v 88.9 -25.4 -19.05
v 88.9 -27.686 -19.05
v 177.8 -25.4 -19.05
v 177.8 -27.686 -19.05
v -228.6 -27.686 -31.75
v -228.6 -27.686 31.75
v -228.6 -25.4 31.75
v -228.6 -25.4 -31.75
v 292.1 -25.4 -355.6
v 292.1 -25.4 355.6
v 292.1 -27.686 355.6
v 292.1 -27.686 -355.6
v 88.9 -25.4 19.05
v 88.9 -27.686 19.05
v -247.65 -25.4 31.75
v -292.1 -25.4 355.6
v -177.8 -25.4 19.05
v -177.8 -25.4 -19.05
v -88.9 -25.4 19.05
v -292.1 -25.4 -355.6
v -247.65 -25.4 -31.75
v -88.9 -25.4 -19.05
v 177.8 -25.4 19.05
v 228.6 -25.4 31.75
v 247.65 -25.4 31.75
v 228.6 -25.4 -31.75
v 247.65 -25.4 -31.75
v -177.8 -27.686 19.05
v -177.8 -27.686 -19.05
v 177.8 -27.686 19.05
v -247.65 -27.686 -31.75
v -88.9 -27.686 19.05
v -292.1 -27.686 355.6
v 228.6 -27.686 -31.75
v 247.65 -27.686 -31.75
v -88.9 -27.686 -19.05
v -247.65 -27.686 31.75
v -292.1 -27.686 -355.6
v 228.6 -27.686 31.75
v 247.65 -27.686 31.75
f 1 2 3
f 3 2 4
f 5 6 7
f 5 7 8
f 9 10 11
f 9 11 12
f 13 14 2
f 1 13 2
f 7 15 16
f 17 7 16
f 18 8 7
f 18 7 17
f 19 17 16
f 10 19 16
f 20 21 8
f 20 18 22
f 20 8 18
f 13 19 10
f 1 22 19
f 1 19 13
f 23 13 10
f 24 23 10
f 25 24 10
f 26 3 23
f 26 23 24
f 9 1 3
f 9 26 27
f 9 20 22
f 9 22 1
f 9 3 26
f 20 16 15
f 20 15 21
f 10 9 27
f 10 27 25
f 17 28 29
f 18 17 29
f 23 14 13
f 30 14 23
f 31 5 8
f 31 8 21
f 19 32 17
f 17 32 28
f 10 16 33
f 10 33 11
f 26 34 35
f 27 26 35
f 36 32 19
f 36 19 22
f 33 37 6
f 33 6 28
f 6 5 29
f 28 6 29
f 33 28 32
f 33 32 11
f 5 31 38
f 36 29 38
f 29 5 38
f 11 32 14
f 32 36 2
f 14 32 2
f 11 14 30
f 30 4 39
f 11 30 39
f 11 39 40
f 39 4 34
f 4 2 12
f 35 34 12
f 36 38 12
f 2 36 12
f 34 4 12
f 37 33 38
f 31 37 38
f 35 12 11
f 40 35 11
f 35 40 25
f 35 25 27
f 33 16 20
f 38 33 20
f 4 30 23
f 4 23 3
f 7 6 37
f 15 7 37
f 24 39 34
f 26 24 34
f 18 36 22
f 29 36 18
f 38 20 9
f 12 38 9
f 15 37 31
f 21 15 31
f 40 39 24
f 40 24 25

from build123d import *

# Parameters (mm, degrees)
SKETCH1_W           = 584.2
SKETCH1_H           = 711.2
BOSS_EXTRUDE1_DEPTH = 2.286
SKETCH3_W           = 19.05
SKETCH3_H           = 63.5
SKETCH3_W_2         = 88.9
SKETCH3_H_2         = 38.1
CUT_EXTRUDE1_DEPTH  = 461.19451952


with BuildPart() as part:
    # Sketch1 → Boss-Extrude1 (new body)
    with BuildSketch(Plane(origin=(0, -25.4, 330.2), x_dir=(1, 0, 0), z_dir=(0, 1, 0))):
        with Locations((0, 330.2)):
            Rectangle(SKETCH1_W, SKETCH1_H)
    extrude(amount=-BOSS_EXTRUDE1_DEPTH)

    # Sketch3 → Cut-Extrude1 (cut, through all)
    with BuildSketch(Plane(origin=(0, -27.686, 0), x_dir=(-1, 0, 0), z_dir=(0, -1, 0))):
        with Locations((238.125, 0)):
            Rectangle(SKETCH3_W, SKETCH3_H)
        with Locations((133.35, 0)):
            Rectangle(SKETCH3_W_2, SKETCH3_H_2)
    cut_extrude1 = extrude(amount=-CUT_EXTRUDE1_DEPTH, mode=Mode.SUBTRACT)

    # Mirror1: Cut-Extrude1 across plane
    add(cut_extrude1.mirror(Plane(origin=(0, 0, 0), x_dir=(0, 0, 1), z_dir=(1, 0, 0))), mode=Mode.SUBTRACT)


solid = part.part
